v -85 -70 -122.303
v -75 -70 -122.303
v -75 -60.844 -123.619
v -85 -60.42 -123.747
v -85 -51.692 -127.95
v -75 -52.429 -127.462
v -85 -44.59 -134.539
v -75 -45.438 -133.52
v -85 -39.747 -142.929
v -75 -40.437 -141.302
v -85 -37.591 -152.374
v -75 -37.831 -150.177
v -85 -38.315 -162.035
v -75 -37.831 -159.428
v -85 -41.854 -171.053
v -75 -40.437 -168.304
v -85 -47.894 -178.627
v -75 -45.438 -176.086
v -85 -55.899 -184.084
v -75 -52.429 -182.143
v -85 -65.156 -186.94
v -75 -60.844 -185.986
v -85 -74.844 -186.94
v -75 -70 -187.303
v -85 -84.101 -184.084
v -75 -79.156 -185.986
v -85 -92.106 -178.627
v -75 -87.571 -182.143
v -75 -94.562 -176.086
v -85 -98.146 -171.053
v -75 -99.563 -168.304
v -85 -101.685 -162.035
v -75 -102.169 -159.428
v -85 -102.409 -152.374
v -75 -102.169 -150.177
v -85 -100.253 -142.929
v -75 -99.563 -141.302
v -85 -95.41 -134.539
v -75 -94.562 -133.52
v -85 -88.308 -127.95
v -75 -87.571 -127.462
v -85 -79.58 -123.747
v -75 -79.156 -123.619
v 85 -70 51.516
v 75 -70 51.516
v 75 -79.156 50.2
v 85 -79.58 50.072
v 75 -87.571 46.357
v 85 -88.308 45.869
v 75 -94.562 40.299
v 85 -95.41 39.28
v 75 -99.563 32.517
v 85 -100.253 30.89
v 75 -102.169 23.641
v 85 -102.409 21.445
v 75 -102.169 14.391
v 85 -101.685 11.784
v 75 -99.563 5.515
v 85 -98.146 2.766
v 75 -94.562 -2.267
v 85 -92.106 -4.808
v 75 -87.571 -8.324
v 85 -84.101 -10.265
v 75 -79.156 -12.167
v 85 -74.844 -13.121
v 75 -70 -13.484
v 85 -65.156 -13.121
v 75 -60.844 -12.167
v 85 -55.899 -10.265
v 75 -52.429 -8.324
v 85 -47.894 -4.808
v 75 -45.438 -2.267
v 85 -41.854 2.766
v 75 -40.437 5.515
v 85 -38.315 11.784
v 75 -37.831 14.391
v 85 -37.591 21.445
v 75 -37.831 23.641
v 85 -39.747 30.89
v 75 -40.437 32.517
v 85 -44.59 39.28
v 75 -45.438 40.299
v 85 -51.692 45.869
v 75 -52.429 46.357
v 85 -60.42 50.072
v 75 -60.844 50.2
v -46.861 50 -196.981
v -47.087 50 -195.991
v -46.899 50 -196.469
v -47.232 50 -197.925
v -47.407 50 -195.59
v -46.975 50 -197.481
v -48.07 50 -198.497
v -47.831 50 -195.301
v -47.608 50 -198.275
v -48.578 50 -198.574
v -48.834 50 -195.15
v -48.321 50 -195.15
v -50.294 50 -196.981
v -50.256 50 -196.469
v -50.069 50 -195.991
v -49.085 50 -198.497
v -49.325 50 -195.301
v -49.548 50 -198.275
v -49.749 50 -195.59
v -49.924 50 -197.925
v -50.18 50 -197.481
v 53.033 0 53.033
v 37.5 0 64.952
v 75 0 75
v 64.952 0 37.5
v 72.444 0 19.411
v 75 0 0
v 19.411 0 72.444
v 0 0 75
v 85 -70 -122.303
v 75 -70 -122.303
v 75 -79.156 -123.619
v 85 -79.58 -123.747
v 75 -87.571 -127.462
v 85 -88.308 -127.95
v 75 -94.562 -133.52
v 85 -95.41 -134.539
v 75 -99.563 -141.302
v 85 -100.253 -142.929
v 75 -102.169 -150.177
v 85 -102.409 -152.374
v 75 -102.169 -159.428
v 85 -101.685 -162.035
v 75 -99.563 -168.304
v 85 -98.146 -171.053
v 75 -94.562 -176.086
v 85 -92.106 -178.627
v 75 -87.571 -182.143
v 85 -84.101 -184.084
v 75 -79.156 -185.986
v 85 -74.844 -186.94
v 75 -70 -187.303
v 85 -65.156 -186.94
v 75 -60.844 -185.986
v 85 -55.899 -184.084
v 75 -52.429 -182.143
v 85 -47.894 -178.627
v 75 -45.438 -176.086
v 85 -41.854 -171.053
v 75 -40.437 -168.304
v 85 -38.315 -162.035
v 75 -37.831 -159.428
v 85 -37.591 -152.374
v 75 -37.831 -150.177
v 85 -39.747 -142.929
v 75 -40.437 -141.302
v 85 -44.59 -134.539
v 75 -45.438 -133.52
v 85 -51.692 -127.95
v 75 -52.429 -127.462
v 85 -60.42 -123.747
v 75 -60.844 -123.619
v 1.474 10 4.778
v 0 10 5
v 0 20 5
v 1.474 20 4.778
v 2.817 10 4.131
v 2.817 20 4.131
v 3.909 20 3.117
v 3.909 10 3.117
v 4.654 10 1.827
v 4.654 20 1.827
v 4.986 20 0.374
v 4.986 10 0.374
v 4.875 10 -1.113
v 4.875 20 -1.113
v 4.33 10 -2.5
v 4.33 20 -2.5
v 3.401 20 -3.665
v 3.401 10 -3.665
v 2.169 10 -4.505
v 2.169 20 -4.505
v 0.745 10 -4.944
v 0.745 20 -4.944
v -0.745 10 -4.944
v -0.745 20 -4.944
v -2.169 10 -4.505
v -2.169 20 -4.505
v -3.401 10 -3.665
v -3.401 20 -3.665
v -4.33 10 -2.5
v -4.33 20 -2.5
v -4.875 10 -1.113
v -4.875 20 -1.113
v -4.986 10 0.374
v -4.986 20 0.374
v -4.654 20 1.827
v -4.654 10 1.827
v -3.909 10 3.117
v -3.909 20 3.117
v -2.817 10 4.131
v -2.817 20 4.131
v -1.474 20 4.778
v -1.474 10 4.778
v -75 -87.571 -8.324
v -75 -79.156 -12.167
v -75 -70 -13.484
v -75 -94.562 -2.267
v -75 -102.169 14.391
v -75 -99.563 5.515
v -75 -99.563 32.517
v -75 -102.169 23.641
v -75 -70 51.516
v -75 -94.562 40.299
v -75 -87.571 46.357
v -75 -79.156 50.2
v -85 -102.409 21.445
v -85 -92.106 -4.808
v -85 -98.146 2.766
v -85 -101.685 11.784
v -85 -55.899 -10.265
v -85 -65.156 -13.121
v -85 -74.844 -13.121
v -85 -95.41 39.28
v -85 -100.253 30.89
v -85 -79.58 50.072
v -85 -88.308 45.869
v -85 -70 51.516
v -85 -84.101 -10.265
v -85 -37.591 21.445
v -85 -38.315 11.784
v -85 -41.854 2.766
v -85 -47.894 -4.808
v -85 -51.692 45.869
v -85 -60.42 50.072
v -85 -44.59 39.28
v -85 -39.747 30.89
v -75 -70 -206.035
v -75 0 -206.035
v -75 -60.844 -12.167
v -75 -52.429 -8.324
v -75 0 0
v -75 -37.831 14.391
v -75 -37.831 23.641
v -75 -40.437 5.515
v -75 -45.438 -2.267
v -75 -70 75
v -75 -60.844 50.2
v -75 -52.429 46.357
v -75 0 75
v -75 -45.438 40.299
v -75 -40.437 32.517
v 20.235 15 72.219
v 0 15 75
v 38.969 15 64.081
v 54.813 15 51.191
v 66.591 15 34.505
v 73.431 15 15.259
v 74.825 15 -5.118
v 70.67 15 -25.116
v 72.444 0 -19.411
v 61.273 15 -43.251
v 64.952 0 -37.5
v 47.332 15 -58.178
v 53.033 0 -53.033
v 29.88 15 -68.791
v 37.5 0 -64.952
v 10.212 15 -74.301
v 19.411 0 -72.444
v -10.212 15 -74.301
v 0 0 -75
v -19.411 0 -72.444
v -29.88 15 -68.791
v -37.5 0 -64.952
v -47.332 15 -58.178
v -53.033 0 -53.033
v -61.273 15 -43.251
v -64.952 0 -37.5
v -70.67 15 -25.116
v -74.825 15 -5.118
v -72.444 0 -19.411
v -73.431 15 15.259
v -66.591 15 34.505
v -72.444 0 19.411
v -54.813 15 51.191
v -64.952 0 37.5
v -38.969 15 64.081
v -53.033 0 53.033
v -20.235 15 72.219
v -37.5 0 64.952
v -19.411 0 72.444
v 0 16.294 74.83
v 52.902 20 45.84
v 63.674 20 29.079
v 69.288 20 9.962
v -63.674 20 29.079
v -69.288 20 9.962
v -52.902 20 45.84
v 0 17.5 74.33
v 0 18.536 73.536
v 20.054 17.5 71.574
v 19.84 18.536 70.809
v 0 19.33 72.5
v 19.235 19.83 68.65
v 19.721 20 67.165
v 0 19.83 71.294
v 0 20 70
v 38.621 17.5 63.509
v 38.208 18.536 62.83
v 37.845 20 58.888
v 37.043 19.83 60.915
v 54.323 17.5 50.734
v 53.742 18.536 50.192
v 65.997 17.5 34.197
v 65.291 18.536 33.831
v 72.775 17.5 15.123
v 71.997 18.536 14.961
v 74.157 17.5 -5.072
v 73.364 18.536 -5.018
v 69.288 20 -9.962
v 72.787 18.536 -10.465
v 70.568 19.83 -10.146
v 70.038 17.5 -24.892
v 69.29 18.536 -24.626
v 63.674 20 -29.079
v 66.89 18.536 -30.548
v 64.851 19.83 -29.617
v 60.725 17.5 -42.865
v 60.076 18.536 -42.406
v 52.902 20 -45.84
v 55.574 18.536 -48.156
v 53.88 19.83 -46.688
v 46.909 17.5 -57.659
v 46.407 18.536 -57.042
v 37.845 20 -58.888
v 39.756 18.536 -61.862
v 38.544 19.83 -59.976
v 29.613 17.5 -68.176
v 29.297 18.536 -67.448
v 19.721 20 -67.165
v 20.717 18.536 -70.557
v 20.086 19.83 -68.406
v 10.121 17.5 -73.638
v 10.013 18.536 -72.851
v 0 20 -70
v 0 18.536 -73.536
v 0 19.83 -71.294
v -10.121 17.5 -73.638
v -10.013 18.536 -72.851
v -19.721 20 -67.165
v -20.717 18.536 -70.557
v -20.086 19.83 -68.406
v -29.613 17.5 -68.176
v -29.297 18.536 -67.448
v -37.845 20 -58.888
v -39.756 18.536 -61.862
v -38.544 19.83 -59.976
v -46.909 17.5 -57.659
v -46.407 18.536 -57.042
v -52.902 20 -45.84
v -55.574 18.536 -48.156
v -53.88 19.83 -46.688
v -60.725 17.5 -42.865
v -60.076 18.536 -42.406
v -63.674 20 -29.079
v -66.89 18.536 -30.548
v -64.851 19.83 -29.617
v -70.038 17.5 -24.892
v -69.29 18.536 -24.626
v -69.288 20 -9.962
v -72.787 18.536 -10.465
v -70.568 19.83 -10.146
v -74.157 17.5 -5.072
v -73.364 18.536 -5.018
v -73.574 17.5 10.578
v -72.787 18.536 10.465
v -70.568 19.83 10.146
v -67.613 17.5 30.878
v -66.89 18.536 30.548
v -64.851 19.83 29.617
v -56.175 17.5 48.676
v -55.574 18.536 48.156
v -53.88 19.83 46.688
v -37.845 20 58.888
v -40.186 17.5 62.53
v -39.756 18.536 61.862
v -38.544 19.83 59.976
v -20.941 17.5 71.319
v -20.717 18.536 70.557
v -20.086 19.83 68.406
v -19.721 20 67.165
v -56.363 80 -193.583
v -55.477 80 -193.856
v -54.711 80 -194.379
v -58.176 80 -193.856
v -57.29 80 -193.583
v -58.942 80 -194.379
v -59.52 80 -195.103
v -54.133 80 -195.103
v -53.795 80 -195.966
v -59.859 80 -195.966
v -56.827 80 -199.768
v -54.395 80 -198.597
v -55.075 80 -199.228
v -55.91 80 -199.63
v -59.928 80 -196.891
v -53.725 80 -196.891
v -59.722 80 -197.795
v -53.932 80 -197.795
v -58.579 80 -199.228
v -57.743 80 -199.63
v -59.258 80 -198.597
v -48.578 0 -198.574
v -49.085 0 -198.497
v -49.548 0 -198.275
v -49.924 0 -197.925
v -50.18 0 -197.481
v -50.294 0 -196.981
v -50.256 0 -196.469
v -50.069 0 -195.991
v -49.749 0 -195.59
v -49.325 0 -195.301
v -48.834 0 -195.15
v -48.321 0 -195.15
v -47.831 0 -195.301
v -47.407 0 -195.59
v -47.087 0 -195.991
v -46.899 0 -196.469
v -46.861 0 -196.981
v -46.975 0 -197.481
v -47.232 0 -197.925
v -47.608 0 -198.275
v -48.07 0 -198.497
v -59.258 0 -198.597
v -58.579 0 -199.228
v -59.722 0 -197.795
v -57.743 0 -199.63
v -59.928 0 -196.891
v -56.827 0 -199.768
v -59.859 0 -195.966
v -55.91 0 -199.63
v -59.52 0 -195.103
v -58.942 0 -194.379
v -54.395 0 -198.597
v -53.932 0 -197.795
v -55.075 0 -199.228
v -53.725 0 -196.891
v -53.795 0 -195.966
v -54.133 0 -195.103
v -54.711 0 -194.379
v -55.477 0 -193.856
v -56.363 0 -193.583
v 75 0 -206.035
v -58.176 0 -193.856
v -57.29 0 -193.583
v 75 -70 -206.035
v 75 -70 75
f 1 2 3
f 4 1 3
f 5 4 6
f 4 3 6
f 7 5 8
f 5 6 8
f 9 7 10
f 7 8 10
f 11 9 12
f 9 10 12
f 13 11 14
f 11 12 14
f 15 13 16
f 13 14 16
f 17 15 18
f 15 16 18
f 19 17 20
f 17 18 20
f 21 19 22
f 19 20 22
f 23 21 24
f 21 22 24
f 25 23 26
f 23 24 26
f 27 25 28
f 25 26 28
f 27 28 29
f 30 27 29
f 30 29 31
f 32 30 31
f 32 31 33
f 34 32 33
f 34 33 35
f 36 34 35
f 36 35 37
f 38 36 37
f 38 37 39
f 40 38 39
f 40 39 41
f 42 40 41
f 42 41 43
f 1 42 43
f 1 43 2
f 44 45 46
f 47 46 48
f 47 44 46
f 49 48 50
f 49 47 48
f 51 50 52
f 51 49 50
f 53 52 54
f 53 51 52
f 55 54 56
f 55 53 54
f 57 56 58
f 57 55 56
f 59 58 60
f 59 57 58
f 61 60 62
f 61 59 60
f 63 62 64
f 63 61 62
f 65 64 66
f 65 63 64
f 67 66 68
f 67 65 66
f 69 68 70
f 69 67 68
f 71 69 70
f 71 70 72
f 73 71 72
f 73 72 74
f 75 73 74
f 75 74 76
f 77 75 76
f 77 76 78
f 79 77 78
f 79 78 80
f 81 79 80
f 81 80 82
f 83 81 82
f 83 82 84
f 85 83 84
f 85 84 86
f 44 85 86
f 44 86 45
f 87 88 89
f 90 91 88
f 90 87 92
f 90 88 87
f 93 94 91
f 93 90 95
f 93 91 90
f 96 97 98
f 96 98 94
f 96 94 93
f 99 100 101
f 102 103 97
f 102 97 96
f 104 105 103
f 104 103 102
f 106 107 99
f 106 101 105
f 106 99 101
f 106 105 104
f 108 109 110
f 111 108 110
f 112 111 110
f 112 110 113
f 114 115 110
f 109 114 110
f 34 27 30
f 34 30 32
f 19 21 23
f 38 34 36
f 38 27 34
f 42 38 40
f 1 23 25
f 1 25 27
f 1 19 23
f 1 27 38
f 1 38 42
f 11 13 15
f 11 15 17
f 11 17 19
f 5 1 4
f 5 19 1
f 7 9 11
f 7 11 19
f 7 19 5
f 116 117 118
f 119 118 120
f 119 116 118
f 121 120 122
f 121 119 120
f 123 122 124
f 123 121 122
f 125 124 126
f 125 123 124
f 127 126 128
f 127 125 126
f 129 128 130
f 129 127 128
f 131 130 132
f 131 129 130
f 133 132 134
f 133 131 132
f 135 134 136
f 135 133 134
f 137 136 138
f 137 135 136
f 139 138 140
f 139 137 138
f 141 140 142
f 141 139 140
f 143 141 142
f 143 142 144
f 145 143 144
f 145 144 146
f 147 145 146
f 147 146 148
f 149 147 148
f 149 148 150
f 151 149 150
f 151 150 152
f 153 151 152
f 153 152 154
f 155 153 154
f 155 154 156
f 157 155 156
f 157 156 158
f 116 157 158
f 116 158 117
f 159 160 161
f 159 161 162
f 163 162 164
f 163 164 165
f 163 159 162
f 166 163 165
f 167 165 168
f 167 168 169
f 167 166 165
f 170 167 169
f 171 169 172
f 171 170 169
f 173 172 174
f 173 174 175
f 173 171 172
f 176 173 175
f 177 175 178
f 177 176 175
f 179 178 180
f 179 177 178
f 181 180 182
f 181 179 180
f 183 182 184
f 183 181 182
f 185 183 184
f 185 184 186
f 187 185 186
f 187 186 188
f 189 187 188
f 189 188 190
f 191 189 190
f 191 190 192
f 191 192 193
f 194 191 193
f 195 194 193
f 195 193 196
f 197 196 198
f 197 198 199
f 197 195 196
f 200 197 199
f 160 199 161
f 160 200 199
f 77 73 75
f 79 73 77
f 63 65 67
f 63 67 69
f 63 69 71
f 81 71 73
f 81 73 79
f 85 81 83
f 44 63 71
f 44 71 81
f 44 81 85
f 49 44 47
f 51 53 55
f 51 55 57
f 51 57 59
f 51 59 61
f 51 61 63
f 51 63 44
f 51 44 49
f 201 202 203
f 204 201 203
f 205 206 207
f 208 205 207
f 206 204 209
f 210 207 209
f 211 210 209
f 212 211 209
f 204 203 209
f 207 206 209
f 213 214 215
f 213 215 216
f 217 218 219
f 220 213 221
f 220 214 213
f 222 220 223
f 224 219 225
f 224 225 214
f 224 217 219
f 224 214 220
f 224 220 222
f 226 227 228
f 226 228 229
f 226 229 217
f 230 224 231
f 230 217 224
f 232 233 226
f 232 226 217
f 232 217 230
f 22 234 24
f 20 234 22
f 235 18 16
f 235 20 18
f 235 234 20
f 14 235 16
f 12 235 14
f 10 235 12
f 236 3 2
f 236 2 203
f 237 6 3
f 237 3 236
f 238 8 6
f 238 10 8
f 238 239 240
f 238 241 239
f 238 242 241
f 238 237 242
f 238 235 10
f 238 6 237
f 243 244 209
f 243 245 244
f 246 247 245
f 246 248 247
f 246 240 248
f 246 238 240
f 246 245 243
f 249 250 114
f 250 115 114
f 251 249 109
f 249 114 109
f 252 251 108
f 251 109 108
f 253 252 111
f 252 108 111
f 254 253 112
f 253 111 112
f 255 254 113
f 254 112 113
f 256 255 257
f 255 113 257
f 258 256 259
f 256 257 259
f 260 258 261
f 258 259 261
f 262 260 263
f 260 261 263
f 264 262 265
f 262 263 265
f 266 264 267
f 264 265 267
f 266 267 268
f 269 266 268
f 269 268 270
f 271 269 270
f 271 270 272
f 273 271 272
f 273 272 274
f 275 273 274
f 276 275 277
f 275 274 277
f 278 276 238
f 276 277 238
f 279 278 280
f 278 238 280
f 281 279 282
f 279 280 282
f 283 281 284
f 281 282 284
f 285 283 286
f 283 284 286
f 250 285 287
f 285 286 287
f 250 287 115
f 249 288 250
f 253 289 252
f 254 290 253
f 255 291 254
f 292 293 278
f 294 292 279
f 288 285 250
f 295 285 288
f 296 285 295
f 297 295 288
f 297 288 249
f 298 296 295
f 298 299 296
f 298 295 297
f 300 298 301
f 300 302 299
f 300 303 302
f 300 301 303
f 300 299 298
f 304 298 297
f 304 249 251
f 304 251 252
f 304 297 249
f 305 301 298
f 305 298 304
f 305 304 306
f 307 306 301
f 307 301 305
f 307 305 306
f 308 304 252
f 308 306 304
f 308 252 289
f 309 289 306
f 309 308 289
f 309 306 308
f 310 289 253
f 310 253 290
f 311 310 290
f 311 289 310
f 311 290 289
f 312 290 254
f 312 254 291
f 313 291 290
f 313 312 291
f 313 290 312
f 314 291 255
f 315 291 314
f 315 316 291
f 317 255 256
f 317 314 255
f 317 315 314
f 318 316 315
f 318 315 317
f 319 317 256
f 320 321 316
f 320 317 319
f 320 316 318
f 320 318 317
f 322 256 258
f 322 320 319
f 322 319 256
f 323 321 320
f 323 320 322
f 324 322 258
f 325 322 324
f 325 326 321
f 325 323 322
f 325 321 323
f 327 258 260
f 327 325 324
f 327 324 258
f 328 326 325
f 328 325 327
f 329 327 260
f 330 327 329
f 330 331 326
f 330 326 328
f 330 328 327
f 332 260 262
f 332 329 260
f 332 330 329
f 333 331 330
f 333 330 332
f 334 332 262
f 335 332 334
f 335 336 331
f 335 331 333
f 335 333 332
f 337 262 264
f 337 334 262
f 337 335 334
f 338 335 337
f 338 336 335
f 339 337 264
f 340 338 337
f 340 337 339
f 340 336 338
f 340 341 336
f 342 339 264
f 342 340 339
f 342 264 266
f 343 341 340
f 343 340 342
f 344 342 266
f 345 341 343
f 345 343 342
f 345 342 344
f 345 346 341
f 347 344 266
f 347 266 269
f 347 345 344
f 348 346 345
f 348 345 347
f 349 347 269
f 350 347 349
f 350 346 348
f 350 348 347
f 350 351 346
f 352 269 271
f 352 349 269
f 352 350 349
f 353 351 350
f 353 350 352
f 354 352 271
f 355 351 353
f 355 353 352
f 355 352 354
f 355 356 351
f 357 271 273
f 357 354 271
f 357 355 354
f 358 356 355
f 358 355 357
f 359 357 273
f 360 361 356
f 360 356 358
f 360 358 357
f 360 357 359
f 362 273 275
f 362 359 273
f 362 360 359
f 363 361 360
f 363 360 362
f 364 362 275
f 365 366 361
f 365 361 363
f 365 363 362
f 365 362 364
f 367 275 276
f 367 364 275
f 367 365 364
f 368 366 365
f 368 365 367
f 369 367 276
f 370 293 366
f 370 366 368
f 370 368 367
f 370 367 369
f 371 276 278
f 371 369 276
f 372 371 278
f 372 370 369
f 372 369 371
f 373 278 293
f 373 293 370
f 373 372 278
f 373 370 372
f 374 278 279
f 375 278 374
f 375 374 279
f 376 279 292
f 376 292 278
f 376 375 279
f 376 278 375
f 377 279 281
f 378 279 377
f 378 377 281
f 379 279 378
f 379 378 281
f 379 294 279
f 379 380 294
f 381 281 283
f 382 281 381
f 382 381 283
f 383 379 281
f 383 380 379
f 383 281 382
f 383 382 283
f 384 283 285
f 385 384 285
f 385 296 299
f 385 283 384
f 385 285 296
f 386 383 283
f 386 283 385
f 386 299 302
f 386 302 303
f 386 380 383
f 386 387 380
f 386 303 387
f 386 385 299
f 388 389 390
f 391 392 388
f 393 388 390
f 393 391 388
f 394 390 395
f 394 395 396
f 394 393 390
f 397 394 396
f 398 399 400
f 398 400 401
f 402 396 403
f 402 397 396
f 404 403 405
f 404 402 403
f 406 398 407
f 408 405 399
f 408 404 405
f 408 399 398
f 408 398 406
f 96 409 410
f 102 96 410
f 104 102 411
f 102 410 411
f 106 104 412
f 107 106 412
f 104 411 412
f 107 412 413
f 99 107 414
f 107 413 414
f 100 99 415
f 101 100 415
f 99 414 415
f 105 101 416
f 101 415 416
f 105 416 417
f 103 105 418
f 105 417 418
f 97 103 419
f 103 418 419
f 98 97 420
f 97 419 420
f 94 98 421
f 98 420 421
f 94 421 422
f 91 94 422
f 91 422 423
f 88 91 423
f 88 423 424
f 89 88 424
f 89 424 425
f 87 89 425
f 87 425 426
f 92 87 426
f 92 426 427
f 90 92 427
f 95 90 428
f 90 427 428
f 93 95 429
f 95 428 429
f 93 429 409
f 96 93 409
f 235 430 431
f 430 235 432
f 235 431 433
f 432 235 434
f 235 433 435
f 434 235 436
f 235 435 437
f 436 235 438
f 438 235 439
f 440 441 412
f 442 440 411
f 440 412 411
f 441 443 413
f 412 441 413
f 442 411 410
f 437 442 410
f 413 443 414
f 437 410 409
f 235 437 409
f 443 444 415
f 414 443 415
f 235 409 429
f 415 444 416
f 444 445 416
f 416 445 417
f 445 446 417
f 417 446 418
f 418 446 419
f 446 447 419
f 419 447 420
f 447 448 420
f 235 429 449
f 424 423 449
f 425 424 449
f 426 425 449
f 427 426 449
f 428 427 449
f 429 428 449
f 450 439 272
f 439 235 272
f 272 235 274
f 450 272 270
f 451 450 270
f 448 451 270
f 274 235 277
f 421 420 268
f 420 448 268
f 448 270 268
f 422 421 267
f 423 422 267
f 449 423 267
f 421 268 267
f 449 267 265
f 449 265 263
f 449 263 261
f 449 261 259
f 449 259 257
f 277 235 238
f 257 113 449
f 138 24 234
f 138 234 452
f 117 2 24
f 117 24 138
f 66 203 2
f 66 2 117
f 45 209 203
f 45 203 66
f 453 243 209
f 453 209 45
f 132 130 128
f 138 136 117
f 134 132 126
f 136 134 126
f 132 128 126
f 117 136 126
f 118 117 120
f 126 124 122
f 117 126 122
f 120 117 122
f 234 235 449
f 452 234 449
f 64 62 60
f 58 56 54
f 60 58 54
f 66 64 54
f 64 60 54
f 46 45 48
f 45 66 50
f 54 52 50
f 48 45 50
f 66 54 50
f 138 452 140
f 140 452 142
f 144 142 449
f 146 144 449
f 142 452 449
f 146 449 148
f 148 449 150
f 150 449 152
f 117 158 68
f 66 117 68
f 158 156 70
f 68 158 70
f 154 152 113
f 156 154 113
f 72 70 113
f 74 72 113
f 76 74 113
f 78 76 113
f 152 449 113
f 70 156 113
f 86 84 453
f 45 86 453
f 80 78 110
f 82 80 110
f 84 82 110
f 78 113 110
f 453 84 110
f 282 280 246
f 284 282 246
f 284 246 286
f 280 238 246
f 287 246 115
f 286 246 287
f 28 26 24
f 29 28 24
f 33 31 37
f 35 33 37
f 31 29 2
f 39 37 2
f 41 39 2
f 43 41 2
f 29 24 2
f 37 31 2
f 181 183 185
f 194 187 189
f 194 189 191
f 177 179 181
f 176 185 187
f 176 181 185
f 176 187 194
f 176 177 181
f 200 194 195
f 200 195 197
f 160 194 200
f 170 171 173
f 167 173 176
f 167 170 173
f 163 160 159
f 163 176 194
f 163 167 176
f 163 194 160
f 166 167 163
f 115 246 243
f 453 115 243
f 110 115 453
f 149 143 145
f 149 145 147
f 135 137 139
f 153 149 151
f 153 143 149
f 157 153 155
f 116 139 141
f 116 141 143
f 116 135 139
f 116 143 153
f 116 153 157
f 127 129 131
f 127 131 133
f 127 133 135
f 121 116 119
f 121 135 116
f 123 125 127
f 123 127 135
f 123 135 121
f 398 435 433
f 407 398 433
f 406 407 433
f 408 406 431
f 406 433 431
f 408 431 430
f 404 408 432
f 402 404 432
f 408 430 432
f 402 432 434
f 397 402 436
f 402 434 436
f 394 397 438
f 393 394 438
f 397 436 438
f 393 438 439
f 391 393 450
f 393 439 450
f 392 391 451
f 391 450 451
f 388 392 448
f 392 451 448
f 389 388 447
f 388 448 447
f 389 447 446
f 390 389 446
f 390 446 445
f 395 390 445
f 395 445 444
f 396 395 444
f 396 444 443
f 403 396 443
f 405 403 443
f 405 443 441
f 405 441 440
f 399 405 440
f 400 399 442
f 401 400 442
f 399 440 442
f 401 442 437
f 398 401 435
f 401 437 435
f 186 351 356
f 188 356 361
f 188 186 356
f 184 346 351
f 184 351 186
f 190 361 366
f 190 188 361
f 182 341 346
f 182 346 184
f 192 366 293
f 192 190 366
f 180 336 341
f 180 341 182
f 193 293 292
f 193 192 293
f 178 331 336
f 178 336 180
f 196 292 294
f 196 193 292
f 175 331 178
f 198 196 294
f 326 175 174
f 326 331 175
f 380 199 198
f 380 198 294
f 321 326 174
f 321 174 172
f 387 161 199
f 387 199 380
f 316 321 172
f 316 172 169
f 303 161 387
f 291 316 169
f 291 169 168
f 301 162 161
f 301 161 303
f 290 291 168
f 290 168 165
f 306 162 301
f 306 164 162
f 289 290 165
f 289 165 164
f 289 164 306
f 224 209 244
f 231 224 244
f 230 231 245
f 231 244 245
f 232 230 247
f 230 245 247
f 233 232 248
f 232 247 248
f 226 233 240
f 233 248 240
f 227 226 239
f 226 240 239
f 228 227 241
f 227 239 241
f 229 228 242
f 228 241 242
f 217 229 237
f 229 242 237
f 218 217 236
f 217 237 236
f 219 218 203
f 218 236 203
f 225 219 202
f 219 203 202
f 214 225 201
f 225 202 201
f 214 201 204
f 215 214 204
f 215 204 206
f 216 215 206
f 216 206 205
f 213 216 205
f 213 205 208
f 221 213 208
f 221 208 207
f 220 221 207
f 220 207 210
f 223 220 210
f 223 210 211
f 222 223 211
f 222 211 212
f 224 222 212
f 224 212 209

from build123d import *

# Parameters (mm, degrees)
SKETCH1_R           = 75
BOSS_EXTRUDE1_DEPTH = 20
FILLET4_R           = 5
CUT_EXTRUDE1_START  = 10
SKETCH2_R           = 5
CUT_EXTRUDE1_DEPTH  = 10
SKETCH3_W           = 150
SKETCH3_H           = 281.035433198
BOSS_EXTRUDE2_DEPTH = 70
SKETCH4_R           = 32.5
BOSS_EXTRUDE3_DEPTH = 10
SKETCH6_R           = 32.5
BOSS_EXTRUDE4_DEPTH = 10
BOSS_EXTRUDE5_START = 10
SKETCH8_R           = 32.5
BOSS_EXTRUDE5_DEPTH = 10
BOSS_EXTRUDE6_START = 10
SKETCH9_R           = 32.5
BOSS_EXTRUDE6_DEPTH = 10
SKETCH10_R          = 3.109945618
BOSS_EXTRUDE7_DEPTH = 80
SKETCH11_R          = 1.721500876
BOSS_EXTRUDE8_DEPTH = 50


with BuildPart() as part:
    # Sketch1 → Boss-Extrude1 (new body)
    with BuildSketch(Plane(origin=(0, 0, 0), x_dir=(1, 0, 0), z_dir=(0, 1, 0))):
        with Locations(Location((0, 0, 0), (0, 0, 270))):
            Circle(SKETCH1_R)
    extrude(amount=BOSS_EXTRUDE1_DEPTH)

    # Fillet4
    fillet4_edges = [part.edges().sort_by_distance(p)[0] for p in [
        (0, 20, -75),
    ]]
    fillet(fillet4_edges, radius=FILLET4_R)

    # Sketch2 → Cut-Extrude1 (cut)
    with BuildSketch(Plane(origin=(0, 0, 0), x_dir=(1, 0, 0), z_dir=(0, 1, 0)).offset(CUT_EXTRUDE1_START)):
        with Locations(Location((0, 0, 0), (0, 0, 270))):
            Circle(SKETCH2_R)
    extrude(amount=CUT_EXTRUDE1_DEPTH, mode=Mode.SUBTRACT)

    # Sketch3 → Boss-Extrude2 (add)
    with BuildSketch(Plane.XZ):
        with Locations((0, -65.517716599)):
            Rectangle(SKETCH3_W, SKETCH3_H)
    extrude(amount=BOSS_EXTRUDE2_DEPTH)

    # Sketch4 → Boss-Extrude3 (add)
    with BuildSketch(Plane.ZY.offset(75)):
        with Locations((-154.802708443, -70)):
            Circle(SKETCH4_R)
    extrude(amount=BOSS_EXTRUDE3_DEPTH)

    # Sketch6 → Boss-Extrude4 (add)
    with BuildSketch(Plane.ZY.offset(75)):
        with Locations((19.016258359, -70)):
            Circle(SKETCH6_R)
    extrude(amount=BOSS_EXTRUDE4_DEPTH)

    # Sketch8 → Boss-Extrude5 (add)
    with BuildSketch(Plane(origin=(75, 0, 0), x_dir=(0, 0, -1), z_dir=(1, 0, 0)).offset(BOSS_EXTRUDE5_START)):
        with Locations(Location((-19.016258359, -70, 0), (0, 0, 180))):
            Circle(SKETCH8_R)
    extrude(amount=-BOSS_EXTRUDE5_DEPTH)

    # Sketch9 → Boss-Extrude6 (add)
    with BuildSketch(Plane(origin=(75, 0, 0), x_dir=(0, 0, -1), z_dir=(1, 0, 0)).offset(BOSS_EXTRUDE6_START)):
        with Locations(Location((154.802708443, -70, 0), (0, 0, 180))):
            Circle(SKETCH9_R)
    extrude(amount=-BOSS_EXTRUDE6_DEPTH)

    # Sketch10 → Boss-Extrude7 (add)
    with BuildSketch(Plane(origin=(0, 0, 0), x_dir=(1, 0, 0), z_dir=(0, 1, 0))):
        with Locations(Location((-56.826635482, 196.658461897, 0), (0, 0, 90))):
            Circle(SKETCH10_R)
    extrude(amount=BOSS_EXTRUDE7_DEPTH)

    # Sketch11 → Boss-Extrude8 (add)
    with BuildSketch(Plane(origin=(0, 0, 0), x_dir=(1, 0, 0), z_dir=(0, 1, 0))):
        with Locations(Location((-48.57774745, 196.85215418, 0), (0, 0, 90))):
            Circle(SKETCH11_R)
    extrude(amount=BOSS_EXTRUDE8_DEPTH)


solid = part.part
